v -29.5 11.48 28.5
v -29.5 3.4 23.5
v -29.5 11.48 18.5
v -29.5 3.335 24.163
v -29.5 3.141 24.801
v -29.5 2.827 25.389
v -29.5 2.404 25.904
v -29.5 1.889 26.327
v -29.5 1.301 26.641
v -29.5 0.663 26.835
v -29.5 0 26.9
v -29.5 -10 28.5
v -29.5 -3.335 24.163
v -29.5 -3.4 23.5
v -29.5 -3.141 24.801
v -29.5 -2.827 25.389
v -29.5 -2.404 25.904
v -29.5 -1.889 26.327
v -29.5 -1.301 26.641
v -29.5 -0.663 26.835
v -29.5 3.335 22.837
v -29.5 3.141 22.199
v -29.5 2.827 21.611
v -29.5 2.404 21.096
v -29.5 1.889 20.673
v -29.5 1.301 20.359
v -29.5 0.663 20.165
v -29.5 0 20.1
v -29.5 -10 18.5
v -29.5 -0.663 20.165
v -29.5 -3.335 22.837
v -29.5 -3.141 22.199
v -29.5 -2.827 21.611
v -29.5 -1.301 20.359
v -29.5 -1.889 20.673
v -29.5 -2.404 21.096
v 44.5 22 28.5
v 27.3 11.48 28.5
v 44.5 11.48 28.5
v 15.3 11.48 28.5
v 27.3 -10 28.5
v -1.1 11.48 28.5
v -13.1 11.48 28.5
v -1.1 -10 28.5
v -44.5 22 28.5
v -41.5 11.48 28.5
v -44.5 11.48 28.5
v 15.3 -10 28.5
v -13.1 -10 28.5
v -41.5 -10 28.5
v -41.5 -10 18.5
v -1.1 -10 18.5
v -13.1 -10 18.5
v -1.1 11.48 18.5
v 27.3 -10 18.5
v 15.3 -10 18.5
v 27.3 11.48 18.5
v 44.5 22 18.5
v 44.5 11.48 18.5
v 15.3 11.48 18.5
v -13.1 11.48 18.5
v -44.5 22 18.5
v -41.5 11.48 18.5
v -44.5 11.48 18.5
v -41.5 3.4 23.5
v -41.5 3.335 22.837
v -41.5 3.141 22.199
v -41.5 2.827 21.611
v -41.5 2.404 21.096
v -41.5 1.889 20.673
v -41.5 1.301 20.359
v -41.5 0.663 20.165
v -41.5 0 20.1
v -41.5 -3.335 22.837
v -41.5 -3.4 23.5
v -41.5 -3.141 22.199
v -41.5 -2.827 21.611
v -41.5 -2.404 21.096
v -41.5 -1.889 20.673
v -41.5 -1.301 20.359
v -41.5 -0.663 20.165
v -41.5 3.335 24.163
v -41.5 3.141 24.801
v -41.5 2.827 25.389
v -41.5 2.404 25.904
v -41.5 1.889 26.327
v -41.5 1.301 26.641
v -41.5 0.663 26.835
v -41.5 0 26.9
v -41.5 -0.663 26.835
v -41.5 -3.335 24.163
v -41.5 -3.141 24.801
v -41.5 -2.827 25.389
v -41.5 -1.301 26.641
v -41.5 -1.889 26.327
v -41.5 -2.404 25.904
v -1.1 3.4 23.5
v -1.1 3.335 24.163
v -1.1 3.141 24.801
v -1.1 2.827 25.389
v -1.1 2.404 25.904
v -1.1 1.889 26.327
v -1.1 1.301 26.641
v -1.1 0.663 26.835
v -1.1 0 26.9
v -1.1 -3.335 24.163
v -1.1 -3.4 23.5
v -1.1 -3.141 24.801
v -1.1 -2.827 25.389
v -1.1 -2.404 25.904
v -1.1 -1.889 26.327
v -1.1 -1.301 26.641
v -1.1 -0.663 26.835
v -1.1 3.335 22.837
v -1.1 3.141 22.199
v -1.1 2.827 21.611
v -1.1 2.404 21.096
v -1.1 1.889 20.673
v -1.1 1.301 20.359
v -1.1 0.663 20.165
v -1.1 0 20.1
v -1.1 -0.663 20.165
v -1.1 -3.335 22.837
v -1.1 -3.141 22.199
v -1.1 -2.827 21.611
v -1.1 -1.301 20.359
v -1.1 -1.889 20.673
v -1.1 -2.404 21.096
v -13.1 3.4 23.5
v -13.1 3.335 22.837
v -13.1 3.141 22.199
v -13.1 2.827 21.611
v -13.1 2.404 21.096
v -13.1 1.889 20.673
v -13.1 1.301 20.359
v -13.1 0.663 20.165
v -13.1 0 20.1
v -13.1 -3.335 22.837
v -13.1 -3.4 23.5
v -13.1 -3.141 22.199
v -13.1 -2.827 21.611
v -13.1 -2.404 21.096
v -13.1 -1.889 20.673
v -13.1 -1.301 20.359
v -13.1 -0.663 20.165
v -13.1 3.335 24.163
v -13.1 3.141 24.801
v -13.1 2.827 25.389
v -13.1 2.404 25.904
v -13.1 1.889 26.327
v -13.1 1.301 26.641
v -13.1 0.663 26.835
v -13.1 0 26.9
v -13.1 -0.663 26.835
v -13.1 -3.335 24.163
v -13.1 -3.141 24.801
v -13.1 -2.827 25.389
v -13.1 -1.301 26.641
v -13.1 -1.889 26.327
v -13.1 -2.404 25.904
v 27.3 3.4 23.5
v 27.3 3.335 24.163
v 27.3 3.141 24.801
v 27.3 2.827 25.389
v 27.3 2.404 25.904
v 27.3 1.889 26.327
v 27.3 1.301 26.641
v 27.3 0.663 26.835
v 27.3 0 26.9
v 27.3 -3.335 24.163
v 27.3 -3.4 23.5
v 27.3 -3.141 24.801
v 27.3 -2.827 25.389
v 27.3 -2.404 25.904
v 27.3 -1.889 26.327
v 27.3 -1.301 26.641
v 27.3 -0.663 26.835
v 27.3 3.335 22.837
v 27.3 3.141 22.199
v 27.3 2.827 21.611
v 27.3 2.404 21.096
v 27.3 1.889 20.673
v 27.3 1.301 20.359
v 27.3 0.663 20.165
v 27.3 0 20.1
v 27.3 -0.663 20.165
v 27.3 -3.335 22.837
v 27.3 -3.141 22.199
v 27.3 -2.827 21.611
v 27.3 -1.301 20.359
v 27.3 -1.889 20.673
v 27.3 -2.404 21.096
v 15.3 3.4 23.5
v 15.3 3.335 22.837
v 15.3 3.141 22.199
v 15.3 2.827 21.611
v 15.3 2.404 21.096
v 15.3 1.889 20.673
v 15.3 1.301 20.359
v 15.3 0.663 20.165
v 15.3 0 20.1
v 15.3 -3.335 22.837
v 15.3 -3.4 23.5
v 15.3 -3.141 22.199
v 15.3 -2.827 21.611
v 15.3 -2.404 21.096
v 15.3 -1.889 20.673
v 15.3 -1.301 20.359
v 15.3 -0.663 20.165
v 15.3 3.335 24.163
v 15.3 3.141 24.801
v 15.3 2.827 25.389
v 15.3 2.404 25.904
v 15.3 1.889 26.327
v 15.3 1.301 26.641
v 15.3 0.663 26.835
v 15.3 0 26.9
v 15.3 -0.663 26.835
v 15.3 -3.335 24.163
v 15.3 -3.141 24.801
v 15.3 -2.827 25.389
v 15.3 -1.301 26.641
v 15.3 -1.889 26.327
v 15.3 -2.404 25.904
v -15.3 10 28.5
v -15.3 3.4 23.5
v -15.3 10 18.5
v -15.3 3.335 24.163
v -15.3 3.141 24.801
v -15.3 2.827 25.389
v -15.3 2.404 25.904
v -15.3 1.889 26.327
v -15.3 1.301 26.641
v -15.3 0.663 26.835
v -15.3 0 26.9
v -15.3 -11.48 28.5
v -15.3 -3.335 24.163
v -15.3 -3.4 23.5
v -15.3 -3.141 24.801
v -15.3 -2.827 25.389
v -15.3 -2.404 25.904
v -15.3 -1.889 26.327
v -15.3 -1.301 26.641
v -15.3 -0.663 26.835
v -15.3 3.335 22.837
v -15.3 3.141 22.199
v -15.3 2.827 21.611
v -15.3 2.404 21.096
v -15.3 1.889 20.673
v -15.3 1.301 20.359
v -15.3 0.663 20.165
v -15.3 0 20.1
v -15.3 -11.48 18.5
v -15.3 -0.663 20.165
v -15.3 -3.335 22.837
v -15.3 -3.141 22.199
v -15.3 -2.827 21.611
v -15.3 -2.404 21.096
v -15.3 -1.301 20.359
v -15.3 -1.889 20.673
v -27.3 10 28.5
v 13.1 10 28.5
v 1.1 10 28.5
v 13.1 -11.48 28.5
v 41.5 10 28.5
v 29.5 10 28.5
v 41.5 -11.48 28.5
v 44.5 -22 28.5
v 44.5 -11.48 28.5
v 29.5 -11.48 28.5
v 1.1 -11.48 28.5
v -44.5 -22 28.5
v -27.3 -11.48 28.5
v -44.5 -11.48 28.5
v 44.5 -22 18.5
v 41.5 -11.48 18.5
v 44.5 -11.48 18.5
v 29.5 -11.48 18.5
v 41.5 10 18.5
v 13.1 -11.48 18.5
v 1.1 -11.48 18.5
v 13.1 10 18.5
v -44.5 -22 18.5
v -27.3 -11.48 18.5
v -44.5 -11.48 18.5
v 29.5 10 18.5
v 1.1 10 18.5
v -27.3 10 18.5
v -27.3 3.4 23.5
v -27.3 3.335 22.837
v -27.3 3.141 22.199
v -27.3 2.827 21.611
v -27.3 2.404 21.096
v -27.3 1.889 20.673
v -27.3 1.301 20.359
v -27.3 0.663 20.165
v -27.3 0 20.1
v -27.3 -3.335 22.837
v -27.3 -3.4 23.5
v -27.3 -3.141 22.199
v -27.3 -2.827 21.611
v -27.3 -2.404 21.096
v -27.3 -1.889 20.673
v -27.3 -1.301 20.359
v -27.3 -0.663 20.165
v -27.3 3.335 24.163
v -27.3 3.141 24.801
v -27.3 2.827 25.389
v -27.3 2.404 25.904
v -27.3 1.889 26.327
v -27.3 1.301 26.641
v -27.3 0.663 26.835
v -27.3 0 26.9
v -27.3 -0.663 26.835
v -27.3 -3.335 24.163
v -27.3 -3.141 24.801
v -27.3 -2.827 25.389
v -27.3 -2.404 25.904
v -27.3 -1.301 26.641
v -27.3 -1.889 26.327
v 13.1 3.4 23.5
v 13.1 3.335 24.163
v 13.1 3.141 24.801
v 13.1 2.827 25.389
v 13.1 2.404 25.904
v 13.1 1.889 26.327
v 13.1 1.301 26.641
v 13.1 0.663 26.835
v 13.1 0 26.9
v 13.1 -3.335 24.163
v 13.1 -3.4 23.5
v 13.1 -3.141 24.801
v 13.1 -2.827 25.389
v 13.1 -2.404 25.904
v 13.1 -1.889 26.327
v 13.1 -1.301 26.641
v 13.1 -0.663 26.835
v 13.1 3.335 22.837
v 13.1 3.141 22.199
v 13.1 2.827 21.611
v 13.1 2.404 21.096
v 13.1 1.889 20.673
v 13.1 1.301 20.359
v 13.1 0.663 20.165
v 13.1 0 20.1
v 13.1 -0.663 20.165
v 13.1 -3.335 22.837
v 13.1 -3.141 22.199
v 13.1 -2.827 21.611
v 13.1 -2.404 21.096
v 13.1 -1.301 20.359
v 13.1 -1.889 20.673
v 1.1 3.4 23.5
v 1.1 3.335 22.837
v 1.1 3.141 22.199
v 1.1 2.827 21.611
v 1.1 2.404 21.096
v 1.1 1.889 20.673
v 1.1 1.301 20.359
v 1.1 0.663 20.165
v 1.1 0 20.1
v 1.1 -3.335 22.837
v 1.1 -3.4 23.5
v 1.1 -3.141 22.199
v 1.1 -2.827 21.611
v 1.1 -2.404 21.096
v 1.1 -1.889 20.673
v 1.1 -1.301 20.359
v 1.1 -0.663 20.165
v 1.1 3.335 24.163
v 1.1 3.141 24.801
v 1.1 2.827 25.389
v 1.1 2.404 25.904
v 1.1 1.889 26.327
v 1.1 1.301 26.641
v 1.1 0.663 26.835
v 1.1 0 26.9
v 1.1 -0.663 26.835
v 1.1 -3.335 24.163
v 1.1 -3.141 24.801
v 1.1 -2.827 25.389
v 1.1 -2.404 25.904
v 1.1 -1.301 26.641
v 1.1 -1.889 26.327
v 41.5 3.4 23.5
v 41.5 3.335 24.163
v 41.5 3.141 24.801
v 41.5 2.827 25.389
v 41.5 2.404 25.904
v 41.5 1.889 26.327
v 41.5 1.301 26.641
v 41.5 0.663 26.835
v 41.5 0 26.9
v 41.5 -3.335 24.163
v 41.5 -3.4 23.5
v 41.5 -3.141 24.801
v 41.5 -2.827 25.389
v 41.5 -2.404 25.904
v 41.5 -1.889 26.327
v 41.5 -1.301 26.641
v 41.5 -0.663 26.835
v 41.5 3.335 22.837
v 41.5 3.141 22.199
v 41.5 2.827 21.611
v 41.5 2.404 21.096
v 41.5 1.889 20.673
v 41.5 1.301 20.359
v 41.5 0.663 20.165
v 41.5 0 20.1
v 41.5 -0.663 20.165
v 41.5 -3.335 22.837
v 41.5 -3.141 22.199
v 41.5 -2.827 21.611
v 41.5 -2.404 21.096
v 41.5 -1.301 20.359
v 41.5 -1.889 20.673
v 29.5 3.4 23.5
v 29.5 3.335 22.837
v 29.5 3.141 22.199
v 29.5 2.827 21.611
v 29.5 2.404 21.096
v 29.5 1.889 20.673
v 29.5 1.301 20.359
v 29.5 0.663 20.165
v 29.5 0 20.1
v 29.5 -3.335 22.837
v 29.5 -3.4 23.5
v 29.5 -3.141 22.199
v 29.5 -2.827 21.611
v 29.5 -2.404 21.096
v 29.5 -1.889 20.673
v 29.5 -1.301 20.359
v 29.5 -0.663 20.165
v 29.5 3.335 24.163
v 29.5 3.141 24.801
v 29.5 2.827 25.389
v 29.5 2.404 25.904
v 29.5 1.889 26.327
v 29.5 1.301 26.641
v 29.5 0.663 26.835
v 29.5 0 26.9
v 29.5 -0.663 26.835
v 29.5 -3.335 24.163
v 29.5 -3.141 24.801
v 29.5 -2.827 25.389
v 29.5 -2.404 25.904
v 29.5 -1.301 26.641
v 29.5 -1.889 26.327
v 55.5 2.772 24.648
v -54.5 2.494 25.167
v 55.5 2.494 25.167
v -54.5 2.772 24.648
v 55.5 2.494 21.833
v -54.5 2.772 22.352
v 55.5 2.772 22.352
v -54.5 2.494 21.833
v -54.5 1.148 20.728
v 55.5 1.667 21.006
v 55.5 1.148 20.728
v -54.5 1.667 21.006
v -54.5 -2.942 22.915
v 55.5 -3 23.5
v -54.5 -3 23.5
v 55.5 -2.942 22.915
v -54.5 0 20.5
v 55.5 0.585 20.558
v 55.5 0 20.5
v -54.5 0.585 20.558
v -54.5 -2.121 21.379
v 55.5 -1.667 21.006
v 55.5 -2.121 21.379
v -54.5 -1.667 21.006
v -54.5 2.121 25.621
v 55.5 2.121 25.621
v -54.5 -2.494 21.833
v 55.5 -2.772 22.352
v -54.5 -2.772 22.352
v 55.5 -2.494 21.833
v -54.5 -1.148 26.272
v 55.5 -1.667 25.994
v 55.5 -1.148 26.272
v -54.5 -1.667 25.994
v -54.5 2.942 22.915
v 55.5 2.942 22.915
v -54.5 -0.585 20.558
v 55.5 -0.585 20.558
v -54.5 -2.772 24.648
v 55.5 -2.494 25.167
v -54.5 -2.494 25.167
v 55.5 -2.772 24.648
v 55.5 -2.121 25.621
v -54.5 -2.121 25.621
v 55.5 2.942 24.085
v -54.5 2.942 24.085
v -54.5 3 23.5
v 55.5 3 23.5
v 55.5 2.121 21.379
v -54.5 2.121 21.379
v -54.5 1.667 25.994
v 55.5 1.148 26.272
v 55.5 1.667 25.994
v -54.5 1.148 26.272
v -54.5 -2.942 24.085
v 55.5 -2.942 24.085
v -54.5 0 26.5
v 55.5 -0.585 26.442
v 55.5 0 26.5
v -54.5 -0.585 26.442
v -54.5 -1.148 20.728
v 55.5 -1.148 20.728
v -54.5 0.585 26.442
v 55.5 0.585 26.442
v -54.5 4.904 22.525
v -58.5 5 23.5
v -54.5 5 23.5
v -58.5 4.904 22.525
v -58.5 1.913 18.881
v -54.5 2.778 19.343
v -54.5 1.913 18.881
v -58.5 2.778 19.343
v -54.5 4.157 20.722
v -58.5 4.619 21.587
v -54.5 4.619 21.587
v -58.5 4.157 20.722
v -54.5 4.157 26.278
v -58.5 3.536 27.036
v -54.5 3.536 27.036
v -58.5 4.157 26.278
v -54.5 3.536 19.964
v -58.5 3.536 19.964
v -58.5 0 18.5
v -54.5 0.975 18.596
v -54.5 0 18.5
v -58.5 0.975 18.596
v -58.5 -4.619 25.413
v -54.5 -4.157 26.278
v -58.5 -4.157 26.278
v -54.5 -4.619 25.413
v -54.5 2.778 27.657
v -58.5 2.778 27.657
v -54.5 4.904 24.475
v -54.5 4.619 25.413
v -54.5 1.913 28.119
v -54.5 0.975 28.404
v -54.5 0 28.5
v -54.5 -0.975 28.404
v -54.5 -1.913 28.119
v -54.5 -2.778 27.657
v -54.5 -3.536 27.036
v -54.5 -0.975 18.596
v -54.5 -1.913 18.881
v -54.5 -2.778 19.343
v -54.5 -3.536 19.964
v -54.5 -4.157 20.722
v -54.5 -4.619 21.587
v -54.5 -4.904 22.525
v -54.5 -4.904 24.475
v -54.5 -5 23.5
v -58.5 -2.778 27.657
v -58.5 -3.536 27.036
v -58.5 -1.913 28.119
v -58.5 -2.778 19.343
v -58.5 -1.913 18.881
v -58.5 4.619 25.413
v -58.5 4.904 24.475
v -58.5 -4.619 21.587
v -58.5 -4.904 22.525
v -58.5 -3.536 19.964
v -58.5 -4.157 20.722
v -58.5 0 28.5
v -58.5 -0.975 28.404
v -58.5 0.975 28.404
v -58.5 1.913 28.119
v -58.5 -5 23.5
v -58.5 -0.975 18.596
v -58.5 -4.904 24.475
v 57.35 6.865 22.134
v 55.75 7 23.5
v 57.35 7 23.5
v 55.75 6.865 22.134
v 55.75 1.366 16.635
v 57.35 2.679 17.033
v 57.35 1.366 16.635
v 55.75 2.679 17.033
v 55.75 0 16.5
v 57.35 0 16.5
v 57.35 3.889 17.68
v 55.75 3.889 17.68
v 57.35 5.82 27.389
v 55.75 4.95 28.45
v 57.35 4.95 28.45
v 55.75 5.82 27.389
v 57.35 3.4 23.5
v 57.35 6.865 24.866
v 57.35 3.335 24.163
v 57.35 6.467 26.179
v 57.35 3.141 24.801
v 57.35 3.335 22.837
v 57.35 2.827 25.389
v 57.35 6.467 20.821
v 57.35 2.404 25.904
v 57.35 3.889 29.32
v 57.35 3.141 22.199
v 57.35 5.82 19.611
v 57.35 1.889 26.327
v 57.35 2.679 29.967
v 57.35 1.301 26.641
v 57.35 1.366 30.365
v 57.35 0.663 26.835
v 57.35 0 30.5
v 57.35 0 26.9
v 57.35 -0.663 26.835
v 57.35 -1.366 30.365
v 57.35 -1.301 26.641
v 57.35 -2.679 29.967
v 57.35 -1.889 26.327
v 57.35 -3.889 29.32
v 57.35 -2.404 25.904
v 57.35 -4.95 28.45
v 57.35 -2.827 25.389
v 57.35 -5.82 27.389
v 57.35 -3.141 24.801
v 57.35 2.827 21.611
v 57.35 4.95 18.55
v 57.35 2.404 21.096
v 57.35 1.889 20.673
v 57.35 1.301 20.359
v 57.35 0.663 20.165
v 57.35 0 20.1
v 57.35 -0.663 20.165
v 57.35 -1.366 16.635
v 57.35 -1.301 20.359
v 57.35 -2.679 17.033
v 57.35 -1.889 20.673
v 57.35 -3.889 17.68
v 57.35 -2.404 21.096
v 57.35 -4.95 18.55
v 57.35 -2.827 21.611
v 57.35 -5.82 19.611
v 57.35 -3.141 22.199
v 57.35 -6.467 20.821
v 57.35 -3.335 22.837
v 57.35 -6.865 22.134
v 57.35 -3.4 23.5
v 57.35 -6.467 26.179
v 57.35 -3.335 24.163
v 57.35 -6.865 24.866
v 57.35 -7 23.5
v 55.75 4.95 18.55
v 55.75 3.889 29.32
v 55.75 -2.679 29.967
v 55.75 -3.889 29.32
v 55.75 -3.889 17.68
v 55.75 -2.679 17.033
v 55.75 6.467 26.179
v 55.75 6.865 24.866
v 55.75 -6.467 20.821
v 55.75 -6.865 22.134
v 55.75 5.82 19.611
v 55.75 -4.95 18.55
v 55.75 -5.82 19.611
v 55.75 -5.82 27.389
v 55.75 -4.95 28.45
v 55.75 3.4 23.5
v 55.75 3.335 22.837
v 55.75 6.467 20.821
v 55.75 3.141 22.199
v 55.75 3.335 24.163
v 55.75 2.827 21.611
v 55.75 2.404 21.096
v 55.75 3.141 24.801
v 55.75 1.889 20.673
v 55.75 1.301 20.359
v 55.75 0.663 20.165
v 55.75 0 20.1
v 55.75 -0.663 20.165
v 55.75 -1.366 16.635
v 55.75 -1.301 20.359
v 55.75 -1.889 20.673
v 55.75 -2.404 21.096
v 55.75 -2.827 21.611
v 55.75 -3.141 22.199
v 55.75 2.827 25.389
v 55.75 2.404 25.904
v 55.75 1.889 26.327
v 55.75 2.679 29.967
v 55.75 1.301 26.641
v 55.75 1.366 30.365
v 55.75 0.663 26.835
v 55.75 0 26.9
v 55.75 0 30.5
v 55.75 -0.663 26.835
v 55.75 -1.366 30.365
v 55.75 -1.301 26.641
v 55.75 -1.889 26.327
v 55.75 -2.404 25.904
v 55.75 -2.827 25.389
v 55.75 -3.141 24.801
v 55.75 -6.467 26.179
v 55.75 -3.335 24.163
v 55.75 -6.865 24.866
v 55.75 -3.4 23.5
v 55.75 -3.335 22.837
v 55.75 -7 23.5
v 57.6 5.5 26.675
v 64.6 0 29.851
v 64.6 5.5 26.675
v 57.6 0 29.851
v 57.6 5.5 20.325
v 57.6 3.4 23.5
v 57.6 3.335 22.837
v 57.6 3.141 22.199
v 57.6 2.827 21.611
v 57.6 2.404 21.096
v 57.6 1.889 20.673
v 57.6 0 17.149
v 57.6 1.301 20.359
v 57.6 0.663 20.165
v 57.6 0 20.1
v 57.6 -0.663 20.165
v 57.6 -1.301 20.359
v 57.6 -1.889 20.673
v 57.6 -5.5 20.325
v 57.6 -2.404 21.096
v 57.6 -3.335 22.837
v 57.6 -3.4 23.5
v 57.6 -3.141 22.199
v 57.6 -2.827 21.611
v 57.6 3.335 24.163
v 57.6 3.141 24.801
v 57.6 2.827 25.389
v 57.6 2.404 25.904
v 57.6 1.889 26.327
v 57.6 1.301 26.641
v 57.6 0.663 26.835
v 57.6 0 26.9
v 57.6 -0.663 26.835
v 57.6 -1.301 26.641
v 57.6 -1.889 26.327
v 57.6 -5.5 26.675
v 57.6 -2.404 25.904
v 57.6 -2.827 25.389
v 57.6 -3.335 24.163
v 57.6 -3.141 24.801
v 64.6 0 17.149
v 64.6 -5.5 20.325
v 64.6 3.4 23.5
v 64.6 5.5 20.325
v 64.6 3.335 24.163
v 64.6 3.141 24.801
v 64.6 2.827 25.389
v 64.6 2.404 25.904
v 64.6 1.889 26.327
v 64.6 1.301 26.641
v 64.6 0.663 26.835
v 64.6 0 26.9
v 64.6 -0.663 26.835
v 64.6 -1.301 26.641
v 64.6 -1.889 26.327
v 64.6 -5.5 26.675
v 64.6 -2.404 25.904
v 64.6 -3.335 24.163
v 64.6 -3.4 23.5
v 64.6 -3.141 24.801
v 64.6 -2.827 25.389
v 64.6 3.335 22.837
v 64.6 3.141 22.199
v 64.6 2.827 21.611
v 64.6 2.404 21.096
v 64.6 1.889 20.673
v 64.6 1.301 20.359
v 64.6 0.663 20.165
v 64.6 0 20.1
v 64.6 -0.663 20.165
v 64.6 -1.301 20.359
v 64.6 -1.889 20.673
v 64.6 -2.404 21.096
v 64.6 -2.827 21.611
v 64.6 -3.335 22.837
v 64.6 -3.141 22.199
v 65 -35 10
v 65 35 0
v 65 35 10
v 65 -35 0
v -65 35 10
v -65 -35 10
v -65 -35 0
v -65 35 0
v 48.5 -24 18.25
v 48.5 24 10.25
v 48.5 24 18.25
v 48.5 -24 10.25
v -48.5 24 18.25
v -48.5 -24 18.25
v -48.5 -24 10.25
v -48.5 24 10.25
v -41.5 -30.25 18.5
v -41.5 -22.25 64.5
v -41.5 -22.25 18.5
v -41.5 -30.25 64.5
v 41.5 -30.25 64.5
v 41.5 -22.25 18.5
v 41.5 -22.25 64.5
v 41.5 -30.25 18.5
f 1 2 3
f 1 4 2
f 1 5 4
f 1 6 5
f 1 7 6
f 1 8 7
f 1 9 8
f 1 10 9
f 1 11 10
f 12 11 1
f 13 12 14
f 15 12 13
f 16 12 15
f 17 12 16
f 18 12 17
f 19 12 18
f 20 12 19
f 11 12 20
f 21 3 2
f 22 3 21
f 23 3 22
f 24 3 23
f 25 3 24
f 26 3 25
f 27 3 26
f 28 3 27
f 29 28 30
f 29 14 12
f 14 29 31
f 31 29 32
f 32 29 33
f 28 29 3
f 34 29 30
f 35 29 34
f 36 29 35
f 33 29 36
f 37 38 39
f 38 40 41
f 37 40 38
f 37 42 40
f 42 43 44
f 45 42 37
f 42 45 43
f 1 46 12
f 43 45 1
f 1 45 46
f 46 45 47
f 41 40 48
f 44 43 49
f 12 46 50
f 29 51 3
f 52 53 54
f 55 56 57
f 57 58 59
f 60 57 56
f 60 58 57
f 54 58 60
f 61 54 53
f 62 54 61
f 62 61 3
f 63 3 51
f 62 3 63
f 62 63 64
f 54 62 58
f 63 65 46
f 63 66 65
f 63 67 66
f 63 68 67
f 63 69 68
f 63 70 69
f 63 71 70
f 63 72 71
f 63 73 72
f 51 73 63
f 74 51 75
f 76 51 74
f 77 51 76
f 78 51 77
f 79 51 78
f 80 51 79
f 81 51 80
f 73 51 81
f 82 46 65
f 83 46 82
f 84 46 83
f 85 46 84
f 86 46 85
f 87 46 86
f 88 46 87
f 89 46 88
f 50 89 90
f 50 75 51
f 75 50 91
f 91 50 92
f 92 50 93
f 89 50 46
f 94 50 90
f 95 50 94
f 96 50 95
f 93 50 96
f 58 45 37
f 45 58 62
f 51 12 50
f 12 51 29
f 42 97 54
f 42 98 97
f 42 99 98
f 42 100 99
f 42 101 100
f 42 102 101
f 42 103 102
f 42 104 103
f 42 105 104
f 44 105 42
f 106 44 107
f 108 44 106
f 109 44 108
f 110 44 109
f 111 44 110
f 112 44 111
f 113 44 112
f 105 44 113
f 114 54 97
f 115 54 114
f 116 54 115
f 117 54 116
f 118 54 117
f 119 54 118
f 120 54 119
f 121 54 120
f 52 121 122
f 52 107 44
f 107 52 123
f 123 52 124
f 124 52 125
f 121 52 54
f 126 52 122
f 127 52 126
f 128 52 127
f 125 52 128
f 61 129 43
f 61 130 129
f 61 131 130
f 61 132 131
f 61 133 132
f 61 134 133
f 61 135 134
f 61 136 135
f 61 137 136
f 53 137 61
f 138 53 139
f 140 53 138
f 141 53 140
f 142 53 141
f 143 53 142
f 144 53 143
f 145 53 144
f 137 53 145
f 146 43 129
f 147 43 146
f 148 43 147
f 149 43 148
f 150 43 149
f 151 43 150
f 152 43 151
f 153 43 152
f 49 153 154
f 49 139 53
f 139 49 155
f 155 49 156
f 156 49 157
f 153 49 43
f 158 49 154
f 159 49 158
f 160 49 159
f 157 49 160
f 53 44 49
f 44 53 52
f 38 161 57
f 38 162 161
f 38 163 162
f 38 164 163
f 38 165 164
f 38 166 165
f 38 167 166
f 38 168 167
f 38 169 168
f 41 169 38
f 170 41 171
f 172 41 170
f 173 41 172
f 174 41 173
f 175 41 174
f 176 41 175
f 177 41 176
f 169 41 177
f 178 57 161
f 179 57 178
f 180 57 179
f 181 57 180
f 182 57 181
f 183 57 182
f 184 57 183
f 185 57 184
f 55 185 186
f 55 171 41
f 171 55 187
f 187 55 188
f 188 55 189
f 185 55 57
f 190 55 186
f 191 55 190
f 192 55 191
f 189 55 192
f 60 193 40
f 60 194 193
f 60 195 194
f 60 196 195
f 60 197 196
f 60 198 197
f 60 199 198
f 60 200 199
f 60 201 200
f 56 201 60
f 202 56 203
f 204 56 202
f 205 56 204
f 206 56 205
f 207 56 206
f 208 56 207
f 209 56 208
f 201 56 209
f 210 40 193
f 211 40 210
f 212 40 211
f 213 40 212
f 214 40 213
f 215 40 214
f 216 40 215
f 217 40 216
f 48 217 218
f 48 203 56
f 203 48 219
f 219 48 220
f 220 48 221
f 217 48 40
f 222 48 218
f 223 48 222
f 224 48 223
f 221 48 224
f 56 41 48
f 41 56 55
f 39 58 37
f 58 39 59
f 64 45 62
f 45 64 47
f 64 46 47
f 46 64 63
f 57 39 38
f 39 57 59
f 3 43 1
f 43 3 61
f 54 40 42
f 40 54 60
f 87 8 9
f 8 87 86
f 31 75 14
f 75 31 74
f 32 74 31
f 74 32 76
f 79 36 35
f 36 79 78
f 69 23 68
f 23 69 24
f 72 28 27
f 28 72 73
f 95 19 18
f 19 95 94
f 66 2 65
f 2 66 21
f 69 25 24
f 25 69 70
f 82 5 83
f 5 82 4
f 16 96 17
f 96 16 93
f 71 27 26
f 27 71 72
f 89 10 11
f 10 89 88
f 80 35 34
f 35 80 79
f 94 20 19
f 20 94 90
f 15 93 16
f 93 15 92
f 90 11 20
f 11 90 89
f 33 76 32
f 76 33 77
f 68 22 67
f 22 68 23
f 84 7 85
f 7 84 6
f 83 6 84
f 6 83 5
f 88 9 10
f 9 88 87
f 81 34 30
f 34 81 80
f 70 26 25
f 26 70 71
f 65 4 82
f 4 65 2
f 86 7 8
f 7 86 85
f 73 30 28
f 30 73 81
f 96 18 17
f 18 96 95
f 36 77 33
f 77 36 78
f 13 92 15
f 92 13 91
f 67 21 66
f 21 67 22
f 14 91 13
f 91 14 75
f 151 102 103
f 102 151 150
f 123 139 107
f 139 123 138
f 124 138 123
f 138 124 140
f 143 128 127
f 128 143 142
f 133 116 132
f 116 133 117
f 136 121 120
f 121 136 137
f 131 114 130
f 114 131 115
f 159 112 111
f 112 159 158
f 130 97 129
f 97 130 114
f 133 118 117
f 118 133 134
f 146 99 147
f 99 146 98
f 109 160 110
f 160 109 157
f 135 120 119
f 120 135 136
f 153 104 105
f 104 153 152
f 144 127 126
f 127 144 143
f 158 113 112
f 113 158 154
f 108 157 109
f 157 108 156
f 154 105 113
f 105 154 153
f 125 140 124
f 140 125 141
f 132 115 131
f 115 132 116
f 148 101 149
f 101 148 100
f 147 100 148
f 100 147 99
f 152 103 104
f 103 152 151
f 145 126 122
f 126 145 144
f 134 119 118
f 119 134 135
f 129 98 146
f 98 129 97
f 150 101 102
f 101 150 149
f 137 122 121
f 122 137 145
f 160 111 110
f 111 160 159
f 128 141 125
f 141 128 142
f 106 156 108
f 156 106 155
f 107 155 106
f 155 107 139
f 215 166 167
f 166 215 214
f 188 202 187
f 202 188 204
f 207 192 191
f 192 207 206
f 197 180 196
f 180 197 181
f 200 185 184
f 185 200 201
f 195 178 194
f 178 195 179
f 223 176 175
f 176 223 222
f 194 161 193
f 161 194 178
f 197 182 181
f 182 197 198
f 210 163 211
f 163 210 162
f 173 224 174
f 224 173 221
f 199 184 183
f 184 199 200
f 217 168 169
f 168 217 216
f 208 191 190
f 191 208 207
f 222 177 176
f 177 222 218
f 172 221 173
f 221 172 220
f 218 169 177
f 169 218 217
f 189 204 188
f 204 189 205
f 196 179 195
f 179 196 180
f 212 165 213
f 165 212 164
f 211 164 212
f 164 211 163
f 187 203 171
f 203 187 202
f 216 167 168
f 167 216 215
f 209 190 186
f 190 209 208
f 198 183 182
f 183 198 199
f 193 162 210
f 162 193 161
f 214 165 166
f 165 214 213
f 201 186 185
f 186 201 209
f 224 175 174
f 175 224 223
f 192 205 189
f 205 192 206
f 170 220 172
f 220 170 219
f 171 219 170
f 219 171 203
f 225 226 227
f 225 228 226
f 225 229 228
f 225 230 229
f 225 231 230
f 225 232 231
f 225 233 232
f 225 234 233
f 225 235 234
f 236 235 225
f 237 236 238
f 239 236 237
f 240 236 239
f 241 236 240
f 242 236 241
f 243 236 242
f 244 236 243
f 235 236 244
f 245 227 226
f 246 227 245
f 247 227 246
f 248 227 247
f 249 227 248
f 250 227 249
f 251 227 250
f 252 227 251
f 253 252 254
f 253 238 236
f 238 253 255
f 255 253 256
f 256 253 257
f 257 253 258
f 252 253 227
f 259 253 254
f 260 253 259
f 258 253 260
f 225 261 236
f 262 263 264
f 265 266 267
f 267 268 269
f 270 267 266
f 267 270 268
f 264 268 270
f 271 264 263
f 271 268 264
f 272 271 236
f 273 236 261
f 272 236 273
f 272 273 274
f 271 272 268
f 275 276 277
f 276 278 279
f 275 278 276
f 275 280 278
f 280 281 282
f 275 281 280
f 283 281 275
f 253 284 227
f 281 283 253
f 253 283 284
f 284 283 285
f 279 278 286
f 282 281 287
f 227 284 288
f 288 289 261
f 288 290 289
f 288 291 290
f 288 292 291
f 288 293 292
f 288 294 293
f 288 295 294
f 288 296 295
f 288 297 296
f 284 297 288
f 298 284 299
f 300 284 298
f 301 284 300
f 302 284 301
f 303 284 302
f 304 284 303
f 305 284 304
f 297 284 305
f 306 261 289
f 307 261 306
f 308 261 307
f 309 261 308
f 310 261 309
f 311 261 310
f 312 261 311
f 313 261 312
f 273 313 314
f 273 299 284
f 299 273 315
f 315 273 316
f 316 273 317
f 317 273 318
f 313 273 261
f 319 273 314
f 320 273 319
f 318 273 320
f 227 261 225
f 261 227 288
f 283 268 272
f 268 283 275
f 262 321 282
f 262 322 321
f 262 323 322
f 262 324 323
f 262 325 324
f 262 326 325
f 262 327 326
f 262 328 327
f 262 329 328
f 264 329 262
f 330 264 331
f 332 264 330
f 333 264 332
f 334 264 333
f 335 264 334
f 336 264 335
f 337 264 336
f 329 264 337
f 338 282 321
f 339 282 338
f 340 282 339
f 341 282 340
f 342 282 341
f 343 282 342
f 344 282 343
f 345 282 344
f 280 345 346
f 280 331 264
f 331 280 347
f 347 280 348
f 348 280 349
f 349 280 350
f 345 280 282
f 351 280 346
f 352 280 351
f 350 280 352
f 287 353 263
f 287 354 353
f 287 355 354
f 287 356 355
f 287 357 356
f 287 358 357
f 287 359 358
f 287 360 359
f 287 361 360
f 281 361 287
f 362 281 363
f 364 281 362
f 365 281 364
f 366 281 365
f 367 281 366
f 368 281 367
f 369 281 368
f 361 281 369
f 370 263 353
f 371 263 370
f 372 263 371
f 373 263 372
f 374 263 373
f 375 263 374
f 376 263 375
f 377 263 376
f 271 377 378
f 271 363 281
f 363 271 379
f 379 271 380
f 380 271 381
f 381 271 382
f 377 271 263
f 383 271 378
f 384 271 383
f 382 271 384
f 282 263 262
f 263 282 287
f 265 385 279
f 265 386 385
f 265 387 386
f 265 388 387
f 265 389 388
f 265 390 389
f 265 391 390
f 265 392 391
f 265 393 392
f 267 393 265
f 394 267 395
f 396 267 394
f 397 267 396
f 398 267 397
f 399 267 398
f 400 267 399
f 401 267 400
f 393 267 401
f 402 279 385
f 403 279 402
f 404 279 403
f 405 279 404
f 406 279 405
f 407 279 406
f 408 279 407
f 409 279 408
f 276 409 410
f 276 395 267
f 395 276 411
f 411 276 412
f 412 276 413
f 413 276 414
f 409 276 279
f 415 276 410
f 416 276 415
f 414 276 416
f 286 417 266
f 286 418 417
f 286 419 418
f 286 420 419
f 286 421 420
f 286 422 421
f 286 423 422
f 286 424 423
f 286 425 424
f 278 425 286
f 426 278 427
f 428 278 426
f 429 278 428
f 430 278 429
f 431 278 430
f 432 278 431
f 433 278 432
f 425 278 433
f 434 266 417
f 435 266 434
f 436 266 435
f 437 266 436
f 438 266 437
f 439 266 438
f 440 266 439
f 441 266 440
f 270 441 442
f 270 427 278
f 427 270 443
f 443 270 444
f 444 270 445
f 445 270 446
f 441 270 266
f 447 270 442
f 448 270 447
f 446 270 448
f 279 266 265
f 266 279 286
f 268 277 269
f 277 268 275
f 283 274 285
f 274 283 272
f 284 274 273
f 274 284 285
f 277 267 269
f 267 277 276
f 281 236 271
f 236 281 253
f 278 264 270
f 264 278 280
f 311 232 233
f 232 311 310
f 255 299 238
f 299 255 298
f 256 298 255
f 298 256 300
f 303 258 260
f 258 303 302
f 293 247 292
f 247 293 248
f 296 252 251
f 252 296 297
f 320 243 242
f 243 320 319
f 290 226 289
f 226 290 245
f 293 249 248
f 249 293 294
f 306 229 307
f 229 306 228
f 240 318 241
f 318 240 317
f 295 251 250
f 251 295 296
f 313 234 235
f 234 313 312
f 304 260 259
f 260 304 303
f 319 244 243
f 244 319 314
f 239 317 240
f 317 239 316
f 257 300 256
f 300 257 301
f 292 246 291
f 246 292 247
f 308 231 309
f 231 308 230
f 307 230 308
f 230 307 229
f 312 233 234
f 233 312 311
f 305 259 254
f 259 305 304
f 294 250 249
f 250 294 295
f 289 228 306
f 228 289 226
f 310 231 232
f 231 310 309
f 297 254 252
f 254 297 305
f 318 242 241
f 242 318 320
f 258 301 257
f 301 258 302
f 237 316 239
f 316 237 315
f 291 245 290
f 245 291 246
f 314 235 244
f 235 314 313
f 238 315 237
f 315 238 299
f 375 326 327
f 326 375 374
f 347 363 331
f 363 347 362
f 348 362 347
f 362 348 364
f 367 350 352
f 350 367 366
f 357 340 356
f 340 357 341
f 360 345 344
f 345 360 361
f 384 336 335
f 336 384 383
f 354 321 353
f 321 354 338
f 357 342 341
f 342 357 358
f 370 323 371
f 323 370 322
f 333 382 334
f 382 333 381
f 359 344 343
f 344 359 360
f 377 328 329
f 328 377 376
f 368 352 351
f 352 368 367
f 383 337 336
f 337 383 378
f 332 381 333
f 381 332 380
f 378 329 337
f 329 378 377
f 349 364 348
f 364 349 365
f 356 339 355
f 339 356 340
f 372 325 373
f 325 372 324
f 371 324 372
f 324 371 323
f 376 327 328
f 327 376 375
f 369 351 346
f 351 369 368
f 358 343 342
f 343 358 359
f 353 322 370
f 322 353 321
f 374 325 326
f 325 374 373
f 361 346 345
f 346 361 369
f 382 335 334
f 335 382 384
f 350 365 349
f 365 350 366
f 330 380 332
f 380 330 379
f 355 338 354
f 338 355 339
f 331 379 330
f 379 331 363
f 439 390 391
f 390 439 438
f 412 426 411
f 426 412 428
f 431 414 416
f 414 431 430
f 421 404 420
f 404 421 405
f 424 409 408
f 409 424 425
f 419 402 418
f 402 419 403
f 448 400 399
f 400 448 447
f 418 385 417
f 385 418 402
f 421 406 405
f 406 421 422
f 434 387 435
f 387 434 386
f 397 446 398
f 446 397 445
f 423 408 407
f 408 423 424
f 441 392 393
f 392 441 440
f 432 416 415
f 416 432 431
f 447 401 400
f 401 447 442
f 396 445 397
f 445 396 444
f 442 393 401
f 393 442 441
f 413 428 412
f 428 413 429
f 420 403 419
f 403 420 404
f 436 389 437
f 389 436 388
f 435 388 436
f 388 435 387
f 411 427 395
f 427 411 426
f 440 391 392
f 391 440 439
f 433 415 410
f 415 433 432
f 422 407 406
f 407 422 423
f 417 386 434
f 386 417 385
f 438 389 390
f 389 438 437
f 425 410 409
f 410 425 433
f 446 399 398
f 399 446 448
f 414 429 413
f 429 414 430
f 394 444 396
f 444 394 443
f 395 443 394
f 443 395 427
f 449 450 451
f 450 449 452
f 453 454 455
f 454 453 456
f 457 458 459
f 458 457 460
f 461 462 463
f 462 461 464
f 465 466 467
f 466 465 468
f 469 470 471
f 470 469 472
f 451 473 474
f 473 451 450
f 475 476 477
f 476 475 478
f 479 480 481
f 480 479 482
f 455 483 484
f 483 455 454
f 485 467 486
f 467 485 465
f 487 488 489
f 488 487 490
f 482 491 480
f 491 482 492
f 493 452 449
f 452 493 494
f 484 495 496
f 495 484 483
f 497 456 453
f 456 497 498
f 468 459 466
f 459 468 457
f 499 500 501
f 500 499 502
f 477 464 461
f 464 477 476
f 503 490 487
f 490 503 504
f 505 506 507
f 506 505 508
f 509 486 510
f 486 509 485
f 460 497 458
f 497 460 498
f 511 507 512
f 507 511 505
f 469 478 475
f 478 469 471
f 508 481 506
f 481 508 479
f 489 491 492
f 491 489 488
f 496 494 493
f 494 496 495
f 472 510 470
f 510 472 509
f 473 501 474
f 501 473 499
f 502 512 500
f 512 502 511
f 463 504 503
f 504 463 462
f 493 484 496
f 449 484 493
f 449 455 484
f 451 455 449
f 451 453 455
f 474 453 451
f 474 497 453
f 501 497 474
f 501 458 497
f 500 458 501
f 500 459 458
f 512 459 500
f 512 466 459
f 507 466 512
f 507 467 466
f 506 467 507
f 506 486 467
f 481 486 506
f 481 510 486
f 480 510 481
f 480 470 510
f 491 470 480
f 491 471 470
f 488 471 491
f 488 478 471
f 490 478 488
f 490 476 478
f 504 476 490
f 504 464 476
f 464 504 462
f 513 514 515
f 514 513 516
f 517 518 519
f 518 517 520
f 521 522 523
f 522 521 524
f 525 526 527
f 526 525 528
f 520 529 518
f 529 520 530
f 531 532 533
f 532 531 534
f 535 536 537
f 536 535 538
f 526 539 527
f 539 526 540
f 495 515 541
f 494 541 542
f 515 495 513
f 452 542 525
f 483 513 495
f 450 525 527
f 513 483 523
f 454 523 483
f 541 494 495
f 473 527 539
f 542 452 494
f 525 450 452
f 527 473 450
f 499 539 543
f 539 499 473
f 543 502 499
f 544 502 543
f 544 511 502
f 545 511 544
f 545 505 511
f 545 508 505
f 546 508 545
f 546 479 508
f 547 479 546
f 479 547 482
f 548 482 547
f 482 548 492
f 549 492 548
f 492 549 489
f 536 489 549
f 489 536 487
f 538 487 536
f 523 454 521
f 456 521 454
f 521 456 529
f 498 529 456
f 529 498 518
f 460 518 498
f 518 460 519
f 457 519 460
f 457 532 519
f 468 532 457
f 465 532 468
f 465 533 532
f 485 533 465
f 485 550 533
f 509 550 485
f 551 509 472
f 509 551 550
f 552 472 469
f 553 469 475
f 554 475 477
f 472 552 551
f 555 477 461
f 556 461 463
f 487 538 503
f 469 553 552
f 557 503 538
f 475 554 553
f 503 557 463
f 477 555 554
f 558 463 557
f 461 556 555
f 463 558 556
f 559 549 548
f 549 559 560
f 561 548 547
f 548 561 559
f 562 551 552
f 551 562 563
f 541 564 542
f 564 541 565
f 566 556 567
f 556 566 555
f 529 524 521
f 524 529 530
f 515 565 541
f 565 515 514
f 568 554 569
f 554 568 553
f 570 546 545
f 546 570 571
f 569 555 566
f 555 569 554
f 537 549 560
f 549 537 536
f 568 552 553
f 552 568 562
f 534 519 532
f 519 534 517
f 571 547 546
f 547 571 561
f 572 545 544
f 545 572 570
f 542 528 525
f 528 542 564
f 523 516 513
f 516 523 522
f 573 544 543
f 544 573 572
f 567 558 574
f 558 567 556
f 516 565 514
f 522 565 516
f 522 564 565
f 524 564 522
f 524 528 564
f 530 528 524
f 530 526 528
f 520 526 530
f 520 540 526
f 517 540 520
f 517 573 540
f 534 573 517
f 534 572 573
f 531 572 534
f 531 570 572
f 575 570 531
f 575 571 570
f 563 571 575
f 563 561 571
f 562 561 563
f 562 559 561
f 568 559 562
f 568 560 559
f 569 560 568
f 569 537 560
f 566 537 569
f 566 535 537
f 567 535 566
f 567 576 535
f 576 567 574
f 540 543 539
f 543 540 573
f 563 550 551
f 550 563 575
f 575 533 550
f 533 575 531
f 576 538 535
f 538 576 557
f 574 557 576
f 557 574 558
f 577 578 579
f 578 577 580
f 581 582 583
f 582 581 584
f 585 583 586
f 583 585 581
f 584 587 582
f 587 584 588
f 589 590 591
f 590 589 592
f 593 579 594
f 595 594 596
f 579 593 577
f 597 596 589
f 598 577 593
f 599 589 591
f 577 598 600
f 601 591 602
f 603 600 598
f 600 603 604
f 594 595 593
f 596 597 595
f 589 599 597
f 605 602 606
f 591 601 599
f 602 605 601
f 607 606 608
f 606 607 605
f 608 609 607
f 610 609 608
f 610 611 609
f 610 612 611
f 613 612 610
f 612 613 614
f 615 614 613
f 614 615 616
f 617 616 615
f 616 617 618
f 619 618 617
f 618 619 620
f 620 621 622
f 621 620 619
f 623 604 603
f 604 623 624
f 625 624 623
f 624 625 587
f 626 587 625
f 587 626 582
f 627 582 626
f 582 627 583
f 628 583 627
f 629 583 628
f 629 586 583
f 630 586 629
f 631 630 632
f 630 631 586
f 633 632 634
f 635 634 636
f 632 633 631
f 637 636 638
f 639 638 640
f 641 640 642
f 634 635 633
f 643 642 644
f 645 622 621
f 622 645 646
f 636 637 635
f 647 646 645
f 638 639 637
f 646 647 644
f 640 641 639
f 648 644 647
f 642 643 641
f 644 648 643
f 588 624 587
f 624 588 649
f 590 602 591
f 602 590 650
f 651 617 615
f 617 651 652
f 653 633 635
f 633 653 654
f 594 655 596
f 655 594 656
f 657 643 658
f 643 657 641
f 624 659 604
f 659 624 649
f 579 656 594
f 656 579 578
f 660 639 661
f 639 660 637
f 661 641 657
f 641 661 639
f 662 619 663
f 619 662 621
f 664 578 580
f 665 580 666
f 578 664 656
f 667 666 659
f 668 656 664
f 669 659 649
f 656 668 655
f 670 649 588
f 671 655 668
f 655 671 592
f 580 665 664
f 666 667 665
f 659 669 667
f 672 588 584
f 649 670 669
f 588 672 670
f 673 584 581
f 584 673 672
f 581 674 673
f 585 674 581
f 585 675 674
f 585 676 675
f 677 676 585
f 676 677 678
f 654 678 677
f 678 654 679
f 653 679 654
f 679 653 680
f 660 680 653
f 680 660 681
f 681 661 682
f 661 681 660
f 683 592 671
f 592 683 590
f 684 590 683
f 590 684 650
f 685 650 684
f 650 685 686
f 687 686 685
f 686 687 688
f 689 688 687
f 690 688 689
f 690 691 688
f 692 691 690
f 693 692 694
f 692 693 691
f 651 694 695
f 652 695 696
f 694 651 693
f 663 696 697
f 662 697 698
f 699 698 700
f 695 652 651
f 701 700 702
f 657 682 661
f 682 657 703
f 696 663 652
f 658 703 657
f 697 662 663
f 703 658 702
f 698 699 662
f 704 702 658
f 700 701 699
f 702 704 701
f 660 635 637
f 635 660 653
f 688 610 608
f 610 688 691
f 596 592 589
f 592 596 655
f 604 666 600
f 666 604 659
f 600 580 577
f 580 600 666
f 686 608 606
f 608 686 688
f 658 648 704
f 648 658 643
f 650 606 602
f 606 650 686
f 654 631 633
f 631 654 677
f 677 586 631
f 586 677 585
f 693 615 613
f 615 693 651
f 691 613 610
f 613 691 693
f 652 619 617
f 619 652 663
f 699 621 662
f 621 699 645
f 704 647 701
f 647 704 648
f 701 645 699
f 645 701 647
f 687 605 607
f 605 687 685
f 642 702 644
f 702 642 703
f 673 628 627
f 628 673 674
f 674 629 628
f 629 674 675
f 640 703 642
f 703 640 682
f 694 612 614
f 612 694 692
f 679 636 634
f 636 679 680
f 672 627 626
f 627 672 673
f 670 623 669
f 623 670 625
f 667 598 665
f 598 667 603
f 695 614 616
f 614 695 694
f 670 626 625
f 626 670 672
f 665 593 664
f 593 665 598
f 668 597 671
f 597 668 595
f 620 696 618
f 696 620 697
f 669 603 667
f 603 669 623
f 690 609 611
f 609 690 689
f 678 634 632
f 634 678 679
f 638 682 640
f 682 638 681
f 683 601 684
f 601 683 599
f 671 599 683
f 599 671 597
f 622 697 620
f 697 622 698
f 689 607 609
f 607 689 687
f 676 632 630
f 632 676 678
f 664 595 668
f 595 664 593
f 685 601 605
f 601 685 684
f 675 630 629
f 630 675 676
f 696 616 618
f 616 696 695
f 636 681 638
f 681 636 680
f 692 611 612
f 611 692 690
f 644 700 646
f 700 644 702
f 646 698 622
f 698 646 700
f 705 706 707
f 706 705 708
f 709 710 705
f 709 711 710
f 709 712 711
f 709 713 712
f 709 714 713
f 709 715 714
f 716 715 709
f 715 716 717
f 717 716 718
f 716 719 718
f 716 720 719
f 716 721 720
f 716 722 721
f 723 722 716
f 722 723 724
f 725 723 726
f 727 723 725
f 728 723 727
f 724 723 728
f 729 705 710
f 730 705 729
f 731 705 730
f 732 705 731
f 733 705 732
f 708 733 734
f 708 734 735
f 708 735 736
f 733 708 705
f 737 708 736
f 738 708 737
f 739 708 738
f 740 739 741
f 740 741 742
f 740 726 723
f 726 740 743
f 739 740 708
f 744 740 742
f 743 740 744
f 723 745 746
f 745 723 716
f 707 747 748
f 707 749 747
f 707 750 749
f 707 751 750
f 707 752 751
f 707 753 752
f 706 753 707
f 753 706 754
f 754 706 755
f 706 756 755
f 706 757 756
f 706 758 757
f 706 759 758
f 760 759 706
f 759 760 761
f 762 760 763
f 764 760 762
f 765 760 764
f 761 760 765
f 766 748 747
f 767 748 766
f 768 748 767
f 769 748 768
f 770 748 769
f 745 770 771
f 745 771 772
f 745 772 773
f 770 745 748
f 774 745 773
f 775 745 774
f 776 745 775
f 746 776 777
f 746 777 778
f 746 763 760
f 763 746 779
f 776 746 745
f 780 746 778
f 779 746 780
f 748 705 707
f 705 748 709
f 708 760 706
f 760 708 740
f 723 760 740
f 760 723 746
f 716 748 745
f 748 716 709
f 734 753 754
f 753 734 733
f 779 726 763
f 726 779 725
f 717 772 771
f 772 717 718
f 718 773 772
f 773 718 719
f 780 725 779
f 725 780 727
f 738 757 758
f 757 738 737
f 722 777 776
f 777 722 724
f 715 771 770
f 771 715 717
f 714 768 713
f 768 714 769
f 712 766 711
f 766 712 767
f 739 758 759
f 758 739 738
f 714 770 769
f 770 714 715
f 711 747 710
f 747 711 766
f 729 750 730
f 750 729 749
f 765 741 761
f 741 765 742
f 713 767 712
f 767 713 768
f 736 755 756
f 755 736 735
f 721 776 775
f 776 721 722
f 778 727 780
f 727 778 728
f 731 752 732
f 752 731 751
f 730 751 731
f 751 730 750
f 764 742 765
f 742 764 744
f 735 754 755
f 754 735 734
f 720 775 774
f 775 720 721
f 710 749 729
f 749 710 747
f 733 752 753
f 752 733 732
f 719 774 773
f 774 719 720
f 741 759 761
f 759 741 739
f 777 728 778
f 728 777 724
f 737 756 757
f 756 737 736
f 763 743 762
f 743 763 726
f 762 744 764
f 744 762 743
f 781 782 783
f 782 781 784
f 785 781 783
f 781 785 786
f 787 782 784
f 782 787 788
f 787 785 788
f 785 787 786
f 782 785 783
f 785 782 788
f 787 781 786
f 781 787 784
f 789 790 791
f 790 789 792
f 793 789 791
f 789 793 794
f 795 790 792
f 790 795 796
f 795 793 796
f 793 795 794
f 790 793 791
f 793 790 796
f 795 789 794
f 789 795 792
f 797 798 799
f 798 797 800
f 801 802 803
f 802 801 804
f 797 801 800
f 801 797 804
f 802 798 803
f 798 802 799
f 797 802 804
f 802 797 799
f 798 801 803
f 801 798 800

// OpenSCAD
$fn = 32;

// ------------------------------------------------------------------------
// Comb hinge with flap: leaf 89 x 22 mm, pin d6, flap 46 mm
// Every part is its own module, assembly() places every instance.
// ------------------------------------------------------------------------

// --- part 1 ---
module hinge_bed() {
  difference() {
    translate([-65, -35, 0]) cube([130, 70, 10]);
  }
}

// --- part 2 ---
module hinge_riser() {
  difference() {
    translate([-48.5, -24, 0]) cube([97, 48, 8]);
  }
}

// --- part 3 ---
module hinge_leaf_a() {
  difference() {
    union() {
      translate([-41.5, -10, -5]) cube([12, 32, 10]);
      translate([-13.1, -10, -5]) cube([12, 32, 10]);
      translate([15.3, -10, -5]) cube([12, 32, 10]);
      translate([-44.5, 11.48, -5]) cube([89, 10.52, 10]);
    }
    translate([-35.5, 0, 0]) rotate([0, 90, 0]) cylinder(h = 14, d = 6.8, center = true);
    translate([-7.1, 0, 0]) rotate([0, 90, 0]) cylinder(h = 14, d = 6.8, center = true);
    translate([21.3, 0, 0]) rotate([0, 90, 0]) cylinder(h = 14, d = 6.8, center = true);
  }
}

// --- part 4 ---
module hinge_leaf_b() {
  difference() {
    union() {
      translate([-27.3, -22, -5]) cube([12, 32, 10]);
      translate([1.1, -22, -5]) cube([12, 32, 10]);
      translate([29.5, -22, -5]) cube([12, 32, 10]);
      translate([-44.5, -22, -5]) cube([89, 10.52, 10]);
    }
    translate([-21.3, 0, 0]) rotate([0, 90, 0]) cylinder(h = 14, d = 6.8, center = true);
    translate([7.1, 0, 0]) rotate([0, 90, 0]) cylinder(h = 14, d = 6.8, center = true);
    translate([35.5, 0, 0]) rotate([0, 90, 0]) cylinder(h = 14, d = 6.8, center = true);
  }
}

// --- part 5 ---
module hinge_flap() {
  difference() {
    translate([-41.5, -23, 0]) cube([83, 46, 8]);
  }
}

// --- part 6 ---
module hinge_pin() {
  rotate([0, 90, 0]) cylinder(h = 111, d = 6, center = true);
  translate([-58.5, 0, 0]) rotate([0, 90, 0]) cylinder(h = 4, d = 10);
}

// --- part 7 ---
module pin_washer() {
  difference() {
      translate([0, 0, 0]) cylinder(h = 1.6, d = 14);
      translate([0, 0, -1]) cylinder(h = 3.6, d = 6.8);
    }
}

// --- part 8 ---
module pin_nut() {
  difference() {
    linear_extrude(height = 7) polygon(points = [[6.351, 0], [3.175, 5.5], [-3.175, 5.5], [-6.351, 0], [-3.175, -5.5], [3.175, -5.5]]);
    translate([0, 0, -1]) cylinder(h = 9, d = 6.8);
  }
}

// --- assembly ---
module assembly() {
  color([0.80, 0.24, 0.20]) translate([0, 0, 0]) rotate([0, 0, 0]) hinge_bed();
  color([0.20, 0.45, 0.75]) translate([0, 0, 10.25]) rotate([0, 0, 0]) hinge_riser();
  color([0.25, 0.62, 0.32]) translate([0, 0, 23.5]) rotate([0, 0, 0]) hinge_leaf_a();
  color([0.92, 0.70, 0.18]) translate([0, 0, 23.5]) rotate([0, 0, 0]) hinge_leaf_b();
  color([0.58, 0.35, 0.70]) translate([0, -22.25, 41.5]) rotate([90, 0, 0]) hinge_flap();
  color([0.16, 0.66, 0.66]) translate([0, 0, 23.5]) rotate([0, 0, 0]) hinge_pin();
  color([0.85, 0.48, 0.18]) translate([55.75, 0, 23.5]) rotate([0, 90, 0]) pin_washer();
  color([0.55, 0.60, 0.65]) translate([57.6, 0, 23.5]) rotate([0, 90, 0]) pin_nut();
}

assembly();
